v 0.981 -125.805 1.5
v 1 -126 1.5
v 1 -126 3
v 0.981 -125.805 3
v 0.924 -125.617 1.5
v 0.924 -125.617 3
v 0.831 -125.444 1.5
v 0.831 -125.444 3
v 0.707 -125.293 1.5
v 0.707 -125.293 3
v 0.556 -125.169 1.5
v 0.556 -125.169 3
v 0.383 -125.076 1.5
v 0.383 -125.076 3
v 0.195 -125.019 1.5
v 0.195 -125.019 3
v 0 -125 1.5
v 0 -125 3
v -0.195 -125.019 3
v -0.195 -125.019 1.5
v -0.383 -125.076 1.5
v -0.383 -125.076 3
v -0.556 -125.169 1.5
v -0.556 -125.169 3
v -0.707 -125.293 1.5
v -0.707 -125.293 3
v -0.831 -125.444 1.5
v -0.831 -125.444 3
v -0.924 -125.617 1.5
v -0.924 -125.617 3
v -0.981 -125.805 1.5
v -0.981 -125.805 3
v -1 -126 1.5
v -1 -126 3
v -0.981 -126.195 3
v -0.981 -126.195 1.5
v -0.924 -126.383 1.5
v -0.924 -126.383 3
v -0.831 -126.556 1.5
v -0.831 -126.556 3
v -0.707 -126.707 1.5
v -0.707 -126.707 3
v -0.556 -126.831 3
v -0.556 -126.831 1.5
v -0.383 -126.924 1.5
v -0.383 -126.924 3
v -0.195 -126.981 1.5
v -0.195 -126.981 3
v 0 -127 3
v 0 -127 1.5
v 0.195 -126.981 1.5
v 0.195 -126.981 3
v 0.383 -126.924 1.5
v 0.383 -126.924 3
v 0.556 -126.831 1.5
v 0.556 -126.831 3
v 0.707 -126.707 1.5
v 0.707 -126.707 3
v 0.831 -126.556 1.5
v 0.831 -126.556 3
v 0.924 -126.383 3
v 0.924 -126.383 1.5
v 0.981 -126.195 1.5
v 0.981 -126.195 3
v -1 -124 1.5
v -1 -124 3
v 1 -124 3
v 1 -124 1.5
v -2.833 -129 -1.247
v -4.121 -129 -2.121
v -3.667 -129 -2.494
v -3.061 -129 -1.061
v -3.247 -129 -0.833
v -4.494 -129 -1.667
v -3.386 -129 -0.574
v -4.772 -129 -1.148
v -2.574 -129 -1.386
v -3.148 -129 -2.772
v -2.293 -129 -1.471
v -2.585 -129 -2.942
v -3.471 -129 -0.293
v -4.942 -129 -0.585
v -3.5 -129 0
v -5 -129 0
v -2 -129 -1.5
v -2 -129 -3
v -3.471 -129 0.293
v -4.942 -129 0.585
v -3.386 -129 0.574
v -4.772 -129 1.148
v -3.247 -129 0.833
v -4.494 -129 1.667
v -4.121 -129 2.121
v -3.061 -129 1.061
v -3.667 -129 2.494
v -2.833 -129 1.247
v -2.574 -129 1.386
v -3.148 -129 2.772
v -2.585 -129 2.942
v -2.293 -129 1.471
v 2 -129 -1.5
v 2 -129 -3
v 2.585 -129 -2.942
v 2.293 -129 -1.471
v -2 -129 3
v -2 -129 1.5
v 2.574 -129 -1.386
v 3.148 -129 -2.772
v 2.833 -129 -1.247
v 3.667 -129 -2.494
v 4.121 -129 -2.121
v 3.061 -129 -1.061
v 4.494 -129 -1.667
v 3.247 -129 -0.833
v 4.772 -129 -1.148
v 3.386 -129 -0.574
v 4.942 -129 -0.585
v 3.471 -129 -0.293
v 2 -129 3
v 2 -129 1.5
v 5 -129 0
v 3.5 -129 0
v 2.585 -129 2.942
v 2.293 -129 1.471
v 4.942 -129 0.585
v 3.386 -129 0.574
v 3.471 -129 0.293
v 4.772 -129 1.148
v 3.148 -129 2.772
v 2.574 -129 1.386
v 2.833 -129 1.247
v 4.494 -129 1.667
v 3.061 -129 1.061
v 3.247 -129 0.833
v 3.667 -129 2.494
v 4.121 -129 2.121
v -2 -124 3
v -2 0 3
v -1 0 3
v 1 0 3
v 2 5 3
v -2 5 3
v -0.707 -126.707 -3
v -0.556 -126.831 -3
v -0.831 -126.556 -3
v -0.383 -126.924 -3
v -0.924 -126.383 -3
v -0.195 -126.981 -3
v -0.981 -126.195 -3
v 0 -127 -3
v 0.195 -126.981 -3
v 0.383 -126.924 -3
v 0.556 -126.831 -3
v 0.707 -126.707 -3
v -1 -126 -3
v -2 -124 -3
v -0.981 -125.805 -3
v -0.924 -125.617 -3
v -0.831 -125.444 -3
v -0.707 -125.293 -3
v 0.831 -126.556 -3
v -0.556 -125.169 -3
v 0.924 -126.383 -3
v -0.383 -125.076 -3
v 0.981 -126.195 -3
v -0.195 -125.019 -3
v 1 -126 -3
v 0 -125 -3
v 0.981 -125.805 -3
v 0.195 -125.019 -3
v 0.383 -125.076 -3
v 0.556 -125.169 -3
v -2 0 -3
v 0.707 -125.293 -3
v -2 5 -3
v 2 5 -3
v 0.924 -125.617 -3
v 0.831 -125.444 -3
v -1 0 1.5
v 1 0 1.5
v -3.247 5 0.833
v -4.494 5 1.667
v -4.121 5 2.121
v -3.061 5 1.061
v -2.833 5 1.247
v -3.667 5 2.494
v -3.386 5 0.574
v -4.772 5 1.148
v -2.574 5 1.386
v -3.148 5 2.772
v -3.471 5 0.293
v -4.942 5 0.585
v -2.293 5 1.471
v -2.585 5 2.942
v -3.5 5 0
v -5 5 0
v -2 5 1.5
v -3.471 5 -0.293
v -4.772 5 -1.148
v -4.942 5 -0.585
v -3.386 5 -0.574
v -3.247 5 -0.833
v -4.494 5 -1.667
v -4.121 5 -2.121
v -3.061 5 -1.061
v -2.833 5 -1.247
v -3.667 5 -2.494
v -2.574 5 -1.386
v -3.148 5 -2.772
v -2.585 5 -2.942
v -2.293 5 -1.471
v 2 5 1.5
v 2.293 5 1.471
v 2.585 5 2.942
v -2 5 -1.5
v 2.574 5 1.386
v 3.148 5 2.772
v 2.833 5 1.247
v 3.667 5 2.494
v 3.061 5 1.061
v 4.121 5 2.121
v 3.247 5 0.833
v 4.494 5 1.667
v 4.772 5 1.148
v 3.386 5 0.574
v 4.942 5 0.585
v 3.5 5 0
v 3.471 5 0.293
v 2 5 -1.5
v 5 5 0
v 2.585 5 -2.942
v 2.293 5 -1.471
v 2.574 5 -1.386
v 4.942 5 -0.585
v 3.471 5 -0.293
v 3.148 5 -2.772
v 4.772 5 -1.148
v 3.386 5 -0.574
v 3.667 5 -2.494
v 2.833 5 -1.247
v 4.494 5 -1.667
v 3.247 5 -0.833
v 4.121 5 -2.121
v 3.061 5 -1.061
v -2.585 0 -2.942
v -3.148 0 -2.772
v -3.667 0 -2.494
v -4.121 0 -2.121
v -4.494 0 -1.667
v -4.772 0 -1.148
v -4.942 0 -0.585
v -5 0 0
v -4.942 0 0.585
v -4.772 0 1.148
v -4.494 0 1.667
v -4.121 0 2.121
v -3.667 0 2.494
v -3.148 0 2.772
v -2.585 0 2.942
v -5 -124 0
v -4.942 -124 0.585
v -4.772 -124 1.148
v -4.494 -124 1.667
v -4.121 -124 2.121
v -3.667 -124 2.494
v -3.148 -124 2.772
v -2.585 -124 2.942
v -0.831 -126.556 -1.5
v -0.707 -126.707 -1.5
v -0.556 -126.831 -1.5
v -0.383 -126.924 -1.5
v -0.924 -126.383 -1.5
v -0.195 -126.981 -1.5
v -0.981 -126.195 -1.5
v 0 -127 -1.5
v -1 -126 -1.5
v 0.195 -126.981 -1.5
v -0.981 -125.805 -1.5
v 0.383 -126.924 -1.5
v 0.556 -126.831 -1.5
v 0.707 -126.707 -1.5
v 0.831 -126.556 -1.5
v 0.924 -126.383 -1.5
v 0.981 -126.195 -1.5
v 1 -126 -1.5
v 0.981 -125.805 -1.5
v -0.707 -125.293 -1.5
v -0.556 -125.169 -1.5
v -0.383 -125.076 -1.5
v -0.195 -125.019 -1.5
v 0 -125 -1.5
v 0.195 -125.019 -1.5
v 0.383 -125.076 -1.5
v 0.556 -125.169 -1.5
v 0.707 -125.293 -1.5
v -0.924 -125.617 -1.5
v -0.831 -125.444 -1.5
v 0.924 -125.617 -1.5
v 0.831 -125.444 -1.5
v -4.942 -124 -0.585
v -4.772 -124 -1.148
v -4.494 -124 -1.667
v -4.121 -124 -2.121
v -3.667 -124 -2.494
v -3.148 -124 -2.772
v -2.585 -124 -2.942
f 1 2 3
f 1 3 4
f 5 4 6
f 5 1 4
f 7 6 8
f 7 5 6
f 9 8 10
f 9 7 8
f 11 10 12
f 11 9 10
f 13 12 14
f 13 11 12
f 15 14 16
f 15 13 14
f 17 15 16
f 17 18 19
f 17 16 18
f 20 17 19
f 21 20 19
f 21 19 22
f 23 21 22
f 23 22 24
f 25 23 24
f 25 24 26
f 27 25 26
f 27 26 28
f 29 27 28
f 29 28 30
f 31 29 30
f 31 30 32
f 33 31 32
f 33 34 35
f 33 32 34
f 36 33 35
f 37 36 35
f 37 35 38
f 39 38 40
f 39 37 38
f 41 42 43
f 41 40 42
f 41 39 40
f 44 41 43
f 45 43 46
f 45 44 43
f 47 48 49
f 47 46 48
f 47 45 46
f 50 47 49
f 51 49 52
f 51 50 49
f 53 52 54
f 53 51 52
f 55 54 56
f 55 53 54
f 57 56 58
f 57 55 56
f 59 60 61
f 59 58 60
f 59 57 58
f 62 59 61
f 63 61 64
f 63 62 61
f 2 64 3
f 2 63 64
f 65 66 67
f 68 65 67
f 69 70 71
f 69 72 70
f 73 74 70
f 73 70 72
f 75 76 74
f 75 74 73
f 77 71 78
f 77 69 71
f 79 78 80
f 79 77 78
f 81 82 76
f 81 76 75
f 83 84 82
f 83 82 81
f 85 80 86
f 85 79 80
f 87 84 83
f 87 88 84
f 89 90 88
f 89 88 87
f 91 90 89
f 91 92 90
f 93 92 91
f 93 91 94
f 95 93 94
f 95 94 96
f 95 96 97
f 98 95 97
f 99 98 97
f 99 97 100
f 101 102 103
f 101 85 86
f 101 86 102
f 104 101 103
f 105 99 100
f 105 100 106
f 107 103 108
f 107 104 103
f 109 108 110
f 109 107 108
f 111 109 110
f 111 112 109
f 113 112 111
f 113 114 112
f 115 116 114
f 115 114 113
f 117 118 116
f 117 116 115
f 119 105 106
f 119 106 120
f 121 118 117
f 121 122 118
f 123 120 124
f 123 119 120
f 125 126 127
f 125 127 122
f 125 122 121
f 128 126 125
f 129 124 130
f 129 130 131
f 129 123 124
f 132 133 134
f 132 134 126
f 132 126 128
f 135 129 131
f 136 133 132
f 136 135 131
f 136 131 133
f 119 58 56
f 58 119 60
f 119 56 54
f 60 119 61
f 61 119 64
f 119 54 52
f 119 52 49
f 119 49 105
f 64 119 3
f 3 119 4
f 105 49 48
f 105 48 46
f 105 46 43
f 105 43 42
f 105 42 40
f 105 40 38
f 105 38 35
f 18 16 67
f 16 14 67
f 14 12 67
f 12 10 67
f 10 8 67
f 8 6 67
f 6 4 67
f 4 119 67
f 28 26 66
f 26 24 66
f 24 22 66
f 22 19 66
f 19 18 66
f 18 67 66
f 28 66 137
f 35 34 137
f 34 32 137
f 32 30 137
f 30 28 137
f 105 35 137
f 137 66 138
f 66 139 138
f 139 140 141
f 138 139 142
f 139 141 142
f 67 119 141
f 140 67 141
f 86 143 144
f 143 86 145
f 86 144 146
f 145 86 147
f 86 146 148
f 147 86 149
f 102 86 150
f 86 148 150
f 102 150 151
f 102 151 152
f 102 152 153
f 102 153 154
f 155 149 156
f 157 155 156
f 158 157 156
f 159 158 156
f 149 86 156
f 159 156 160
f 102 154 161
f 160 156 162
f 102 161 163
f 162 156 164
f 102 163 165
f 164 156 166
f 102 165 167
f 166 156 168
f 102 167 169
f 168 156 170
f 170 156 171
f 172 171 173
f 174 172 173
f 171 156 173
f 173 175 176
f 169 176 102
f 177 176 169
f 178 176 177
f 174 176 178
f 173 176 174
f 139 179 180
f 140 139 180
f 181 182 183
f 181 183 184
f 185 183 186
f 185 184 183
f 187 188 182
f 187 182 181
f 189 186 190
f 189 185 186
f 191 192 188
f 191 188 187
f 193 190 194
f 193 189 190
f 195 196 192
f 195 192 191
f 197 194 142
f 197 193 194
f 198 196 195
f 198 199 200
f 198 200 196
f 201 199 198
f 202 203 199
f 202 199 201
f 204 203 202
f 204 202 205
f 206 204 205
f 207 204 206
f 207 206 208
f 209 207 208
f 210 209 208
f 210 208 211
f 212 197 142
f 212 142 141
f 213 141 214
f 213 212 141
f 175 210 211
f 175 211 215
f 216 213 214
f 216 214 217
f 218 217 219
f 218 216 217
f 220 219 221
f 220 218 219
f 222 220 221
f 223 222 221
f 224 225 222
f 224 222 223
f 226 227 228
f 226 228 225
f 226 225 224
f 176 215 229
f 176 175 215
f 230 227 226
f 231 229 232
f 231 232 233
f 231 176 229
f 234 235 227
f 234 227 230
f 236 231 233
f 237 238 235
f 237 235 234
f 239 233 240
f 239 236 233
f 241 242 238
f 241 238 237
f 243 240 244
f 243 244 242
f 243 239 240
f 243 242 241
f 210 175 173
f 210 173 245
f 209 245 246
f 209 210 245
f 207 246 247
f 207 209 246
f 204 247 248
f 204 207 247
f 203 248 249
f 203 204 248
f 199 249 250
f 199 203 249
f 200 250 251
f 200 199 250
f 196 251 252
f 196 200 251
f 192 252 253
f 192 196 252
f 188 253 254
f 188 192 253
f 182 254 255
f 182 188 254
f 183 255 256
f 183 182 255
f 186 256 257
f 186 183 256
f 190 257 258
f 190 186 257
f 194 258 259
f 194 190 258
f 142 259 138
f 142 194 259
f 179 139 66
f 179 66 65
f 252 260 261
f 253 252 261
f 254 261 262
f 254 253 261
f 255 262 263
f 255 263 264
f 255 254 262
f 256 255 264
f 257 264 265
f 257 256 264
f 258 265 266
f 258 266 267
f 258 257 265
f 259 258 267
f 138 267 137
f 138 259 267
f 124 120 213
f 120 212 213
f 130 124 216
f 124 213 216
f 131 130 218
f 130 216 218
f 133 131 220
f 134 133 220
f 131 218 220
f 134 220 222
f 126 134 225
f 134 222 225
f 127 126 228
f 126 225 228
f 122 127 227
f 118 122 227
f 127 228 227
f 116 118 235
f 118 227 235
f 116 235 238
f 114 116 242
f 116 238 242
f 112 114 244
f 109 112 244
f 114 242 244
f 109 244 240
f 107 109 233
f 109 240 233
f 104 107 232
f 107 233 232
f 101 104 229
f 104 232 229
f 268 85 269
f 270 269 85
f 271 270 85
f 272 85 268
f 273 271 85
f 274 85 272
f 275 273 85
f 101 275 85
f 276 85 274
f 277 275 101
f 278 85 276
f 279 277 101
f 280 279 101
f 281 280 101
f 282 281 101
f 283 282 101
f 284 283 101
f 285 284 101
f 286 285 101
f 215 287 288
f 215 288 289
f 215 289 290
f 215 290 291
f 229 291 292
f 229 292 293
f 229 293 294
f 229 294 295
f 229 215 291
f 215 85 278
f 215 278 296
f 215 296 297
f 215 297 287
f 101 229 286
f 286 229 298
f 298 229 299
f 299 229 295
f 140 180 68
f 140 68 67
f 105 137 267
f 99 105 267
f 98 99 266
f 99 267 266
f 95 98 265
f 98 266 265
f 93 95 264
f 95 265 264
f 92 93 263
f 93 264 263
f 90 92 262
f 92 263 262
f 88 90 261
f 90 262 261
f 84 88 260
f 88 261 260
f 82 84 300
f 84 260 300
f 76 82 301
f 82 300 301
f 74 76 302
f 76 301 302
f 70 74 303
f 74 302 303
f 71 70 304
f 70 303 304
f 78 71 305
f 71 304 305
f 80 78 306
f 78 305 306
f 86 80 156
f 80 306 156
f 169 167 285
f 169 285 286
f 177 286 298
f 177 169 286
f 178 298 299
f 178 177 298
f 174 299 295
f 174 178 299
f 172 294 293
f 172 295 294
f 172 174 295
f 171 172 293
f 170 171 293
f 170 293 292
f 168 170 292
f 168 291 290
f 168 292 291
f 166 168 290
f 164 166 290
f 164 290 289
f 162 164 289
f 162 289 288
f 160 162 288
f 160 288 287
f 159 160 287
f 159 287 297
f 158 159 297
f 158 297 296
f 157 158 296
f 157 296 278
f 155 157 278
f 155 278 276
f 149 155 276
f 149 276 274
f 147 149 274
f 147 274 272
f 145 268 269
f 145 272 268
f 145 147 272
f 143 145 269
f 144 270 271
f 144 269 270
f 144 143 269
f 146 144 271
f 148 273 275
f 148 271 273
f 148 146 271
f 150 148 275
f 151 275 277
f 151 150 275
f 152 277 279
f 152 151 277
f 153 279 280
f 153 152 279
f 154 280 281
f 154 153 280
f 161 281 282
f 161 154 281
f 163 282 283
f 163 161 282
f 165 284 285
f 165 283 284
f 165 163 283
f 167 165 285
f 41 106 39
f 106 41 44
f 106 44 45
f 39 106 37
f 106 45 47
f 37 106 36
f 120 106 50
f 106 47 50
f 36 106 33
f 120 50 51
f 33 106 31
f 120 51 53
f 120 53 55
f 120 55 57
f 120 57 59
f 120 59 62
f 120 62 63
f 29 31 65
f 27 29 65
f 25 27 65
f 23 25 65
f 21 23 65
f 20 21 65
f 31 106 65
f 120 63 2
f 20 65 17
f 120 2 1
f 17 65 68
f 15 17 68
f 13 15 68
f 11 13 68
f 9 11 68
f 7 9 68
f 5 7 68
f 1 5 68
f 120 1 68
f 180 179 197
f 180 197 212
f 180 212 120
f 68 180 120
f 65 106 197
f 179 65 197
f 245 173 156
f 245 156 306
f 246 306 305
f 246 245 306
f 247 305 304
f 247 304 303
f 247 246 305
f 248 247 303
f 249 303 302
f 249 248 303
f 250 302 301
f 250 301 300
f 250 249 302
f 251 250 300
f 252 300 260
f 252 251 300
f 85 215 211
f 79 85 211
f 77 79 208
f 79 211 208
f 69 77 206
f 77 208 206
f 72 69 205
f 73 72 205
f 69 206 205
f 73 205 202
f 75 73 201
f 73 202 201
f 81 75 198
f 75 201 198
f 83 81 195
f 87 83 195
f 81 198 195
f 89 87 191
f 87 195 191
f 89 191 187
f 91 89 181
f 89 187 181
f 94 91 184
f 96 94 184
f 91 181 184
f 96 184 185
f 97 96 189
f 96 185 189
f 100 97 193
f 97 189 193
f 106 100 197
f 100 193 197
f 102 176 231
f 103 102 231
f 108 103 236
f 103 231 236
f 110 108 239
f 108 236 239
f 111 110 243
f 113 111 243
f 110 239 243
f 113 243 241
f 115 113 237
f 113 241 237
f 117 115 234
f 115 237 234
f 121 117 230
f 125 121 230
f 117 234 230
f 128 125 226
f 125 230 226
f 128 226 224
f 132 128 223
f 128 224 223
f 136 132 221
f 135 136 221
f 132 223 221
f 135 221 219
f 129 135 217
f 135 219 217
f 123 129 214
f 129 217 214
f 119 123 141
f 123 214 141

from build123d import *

# Parameters (mm, degrees)
SALIENTE_EXTRUIR1_DEPTH    = 124
SALIENTE_EXTRUIR3_START    = 5
CROQUIS7_W                 = 4
CROQUIS7_H                 = 1.5
CROQUIS7_W_2               = 2
CROQUIS7_W_3               = 1
SALIENTE_EXTRUIR3_DEPTH    = 5
CROQUIS8_W                 = 2
CROQUIS8_H                 = 1.5
CROQUIS8_W_2               = 4
SALIENTE_EXTRUIR4_DEPTH    = 5
CORTAR_EXTRUIR1_DEPTH      = 130.236217834
CORTAR_EXTRUIR1_DEPTH_BACK = 130.236217834
CROQUIS9_R                 = 1


with BuildPart() as part:
    # Croquis1 → Saliente-Extruir1 (new body)
    with BuildSketch(Plane(origin=(0, 0, 0), x_dir=(1, 0, 0), z_dir=(0, 1, 0))):
        with BuildLine():
            Line((-2, 1.5), (0, 1.5))
            Line((0, 1.5), (2, 1.5))
            ThreePointArc((2, 1.5), (3.5, 0), (2, -1.5))
            Line((2, -1.5), (1, -1.5))
            Line((1, -1.5), (1, -3))
            Line((1, -3), (2, -3))
            ThreePointArc((2, -3), (4.121320344, -2.121320344), (5, 0))
            ThreePointArc((5, 0), (4.121320344, 2.121320344), (2, 3))
            Line((2, 3), (0, 3))
            Line((0, 3), (-2, 3))
            ThreePointArc((-2, 3), (-4.121320347, 2.12132034), (-5, -9e-09))
            ThreePointArc((-5, -9e-09), (-4.12132034, -2.121320347), (-2, -3))
            Line((-2, -3), (-1, -3))
            Line((-1, -3), (-1, -1.5))
            Line((-1, -1.5), (-2, -1.5))
            ThreePointArc((-2, -1.5), (-3.5, 0), (-2, 1.5))
        make_face()
    extrude(amount=-SALIENTE_EXTRUIR1_DEPTH)

    # Croquis7 → Saliente-Extruir3 (add)
    with BuildSketch(Plane(origin=(0, 0, 0), x_dir=(1, 0, 0), z_dir=(0, 1, 0)).offset(SALIENTE_EXTRUIR3_START)):
        with Locations((0, 2.25)):
            Rectangle(CROQUIS7_W, CROQUIS7_H)
        with BuildLine():
            Line((-2, 1.5), (-2, 3))
            ThreePointArc((-2, 3), (-5, 0), (-2, -3))
            Line((-2, -3), (-2, -1.5))
            ThreePointArc((-2, -1.5), (-3.5, 0), (-2, 1.5))
        make_face()
        with Locations((0, -2.25)):
            Rectangle(CROQUIS7_W_2, CROQUIS7_H)
        with Locations((-1.5, -2.25)):
            Rectangle(CROQUIS7_W_3, CROQUIS7_H)
        with BuildLine():
            Line((2, 3), (2, 1.5))
            ThreePointArc((2, 1.5), (3.5, 0), (2, -1.5))
            Line((2, -1.5), (1, -1.5))
            Line((1, -1.5), (1, -3))
            Line((1, -3), (2, -3))
            ThreePointArc((2, -3), (5, 0), (2, 3))
        make_face()
    extrude(amount=-SALIENTE_EXTRUIR3_DEPTH)

    # Croquis8 → Saliente-Extruir4 (add)
    with BuildSketch(Plane.XZ.offset(124)):
        with BuildLine():
            Line((-2, -3), (-2, -1.5))
            ThreePointArc((-2, -1.5), (-3.5, 0), (-2, 1.5))
            Line((-2, 1.5), (-1, 1.5))
            Line((-1, 1.5), (-1, 3))
            Line((-1, 3), (-2, 3))
            ThreePointArc((-2, 3), (-5, 0), (-2, -3))
        make_face()
        with Locations((0, 2.25)):
            Rectangle(CROQUIS8_W, CROQUIS8_H)
        with BuildLine():
            Line((2, -1.5), (2, -3))
            ThreePointArc((2, -3), (5, 0), (2, 3))
            Line((2, 3), (1, 3))
            Line((1, 3), (1, 1.5))
            Line((1, 1.5), (2, 1.5))
            ThreePointArc((2, 1.5), (3.5, 0), (2, -1.5))
        make_face()
        with Locations((0, -2.25)):
            Rectangle(CROQUIS8_W_2, CROQUIS8_H)
    extrude(amount=SALIENTE_EXTRUIR4_DEPTH)

    # Croquis9 → Cortar-Extruir1 (cut, two sides: drawn at the far end of the back side and taken through both)
    with BuildSketch(Plane.XY.offset(3).offset(-CORTAR_EXTRUIR1_DEPTH_BACK)):
        with Locations((0, -126)):
            Circle(CROQUIS9_R)
    extrude(amount=CORTAR_EXTRUIR1_DEPTH + CORTAR_EXTRUIR1_DEPTH_BACK, mode=Mode.SUBTRACT)


solid = part.part
